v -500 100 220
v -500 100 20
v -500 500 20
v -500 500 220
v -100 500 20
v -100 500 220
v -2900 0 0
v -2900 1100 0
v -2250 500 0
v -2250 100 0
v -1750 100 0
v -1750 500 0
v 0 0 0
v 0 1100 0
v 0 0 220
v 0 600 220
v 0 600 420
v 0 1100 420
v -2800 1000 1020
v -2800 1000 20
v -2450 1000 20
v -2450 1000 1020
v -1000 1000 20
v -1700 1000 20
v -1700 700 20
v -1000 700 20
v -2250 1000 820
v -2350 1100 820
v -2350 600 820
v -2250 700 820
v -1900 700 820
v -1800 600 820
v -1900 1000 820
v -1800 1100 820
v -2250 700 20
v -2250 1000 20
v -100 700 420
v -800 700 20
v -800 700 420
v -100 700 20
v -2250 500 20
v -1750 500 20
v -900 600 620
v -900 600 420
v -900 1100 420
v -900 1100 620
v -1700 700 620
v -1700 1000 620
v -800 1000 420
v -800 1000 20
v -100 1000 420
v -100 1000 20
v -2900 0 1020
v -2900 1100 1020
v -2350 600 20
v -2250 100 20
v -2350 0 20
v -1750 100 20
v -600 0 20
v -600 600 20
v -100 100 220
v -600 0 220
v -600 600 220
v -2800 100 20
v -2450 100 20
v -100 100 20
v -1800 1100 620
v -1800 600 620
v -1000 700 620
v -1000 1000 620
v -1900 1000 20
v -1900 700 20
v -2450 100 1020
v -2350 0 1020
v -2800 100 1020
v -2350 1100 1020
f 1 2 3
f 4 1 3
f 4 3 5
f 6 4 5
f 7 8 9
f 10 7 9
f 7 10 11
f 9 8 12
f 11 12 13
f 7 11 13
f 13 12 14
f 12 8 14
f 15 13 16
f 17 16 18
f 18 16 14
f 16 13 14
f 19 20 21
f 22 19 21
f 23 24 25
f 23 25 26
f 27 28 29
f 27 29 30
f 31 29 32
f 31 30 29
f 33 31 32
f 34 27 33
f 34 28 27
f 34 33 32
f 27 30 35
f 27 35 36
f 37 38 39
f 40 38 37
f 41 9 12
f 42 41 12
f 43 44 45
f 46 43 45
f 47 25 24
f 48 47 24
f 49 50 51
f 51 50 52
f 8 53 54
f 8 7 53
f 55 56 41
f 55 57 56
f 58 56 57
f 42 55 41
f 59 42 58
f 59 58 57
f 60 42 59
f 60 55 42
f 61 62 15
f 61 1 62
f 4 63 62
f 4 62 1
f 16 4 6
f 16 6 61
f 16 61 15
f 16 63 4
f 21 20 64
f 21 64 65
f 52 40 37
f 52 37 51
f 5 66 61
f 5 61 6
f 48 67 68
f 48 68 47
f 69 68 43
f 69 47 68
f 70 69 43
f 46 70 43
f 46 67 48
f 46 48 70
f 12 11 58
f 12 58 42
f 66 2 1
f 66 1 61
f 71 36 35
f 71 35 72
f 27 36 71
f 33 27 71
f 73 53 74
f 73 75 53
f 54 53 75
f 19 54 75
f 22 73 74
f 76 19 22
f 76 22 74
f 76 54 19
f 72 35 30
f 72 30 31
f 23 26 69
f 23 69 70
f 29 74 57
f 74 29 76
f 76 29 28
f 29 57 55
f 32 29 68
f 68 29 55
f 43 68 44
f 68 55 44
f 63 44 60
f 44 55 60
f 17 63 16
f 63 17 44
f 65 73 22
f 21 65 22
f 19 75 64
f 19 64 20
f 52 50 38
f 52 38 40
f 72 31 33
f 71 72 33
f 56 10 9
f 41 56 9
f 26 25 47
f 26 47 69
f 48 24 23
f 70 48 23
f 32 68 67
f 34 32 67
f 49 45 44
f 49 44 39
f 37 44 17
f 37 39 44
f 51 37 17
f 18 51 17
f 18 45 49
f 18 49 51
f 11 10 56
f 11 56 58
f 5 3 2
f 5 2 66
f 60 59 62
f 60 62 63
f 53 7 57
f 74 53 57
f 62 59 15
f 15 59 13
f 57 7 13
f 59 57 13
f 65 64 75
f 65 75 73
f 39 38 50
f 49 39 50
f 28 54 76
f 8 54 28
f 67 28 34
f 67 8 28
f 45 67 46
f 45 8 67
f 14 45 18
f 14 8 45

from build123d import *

# Parameters (mm, degrees)
F0_W      = 500
F0_H      = 400
F1_DEPTH  = 20
F2_W      = 900
F2_H      = 500
F2_W_2    = 700
F2_H_2    = 300
F3_DEPTH  = 400
F4_W      = 900
F4_H      = 500
F4_W_2    = 700
F4_H_2    = 300
F5_DEPTH  = 600
F6_W      = 550
F6_H      = 500
F6_W_2    = 350
F6_H_2    = 300
F7_DEPTH  = 800
F8_W      = 550
F8_H      = 1100
F8_W_2    = 350
F8_H_2    = 900
F9_DEPTH  = 1000
F10_W     = 600
F10_H     = 600
F10_W_2   = 400
F10_H_2   = 400
F11_DEPTH = 200


with BuildPart() as f1:
    # F0 (on Top) → F1 (new body)
    with BuildSketch(Plane.XY):
        Polygon((-2350, 0), (0, 0), (0, 1100), (-2900, 1100), (-2900, 0), align=None)
        with Locations((-2000, 300)):
            Rectangle(F0_W, F0_H, mode=Mode.SUBTRACT)
    extrude(amount=F1_DEPTH)

    # F2 (on face) → F3 (join)
    with BuildSketch(Plane.XY.offset(20)):
        with Locations((-450, 850)):
            Rectangle(F2_W, F2_H)
        with Locations((-450, 850)):
            Rectangle(F2_W_2, F2_H_2, mode=Mode.SUBTRACT)
    extrude(amount=F3_DEPTH)

    # F4 (on face) → F5 (join)
    with BuildSketch(Plane.XY.offset(20)):
        with Locations((-1350, 850)):
            Rectangle(F4_W, F4_H)
        with Locations((-1350, 850)):
            Rectangle(F4_W_2, F4_H_2, mode=Mode.SUBTRACT)
    extrude(amount=F5_DEPTH)

    # F6 (on face) → F7 (join)
    with BuildSketch(Plane.XY.offset(20)):
        with Locations((-2075, 850)):
            Rectangle(F6_W, F6_H)
        with Locations((-2075, 850)):
            Rectangle(F6_W_2, F6_H_2, mode=Mode.SUBTRACT)
    extrude(amount=F7_DEPTH)

    # F8 (on face) → F9 (join)
    with BuildSketch(Plane.XY.offset(20)):
        with Locations((-2625, 550)):
            Rectangle(F8_W, F8_H)
        with Locations((-2625, 550)):
            Rectangle(F8_W_2, F8_H_2, mode=Mode.SUBTRACT)
    extrude(amount=F9_DEPTH)

    # F10 (on face) → F11 (join)
    with BuildSketch(Plane.XY.offset(20)):
        with Locations((-300, 300)):
            Rectangle(F10_W, F10_H)
        with Locations((-300, 300)):
            Rectangle(F10_W_2, F10_H_2, mode=Mode.SUBTRACT)
    extrude(amount=F11_DEPTH)


solid = f1.part
